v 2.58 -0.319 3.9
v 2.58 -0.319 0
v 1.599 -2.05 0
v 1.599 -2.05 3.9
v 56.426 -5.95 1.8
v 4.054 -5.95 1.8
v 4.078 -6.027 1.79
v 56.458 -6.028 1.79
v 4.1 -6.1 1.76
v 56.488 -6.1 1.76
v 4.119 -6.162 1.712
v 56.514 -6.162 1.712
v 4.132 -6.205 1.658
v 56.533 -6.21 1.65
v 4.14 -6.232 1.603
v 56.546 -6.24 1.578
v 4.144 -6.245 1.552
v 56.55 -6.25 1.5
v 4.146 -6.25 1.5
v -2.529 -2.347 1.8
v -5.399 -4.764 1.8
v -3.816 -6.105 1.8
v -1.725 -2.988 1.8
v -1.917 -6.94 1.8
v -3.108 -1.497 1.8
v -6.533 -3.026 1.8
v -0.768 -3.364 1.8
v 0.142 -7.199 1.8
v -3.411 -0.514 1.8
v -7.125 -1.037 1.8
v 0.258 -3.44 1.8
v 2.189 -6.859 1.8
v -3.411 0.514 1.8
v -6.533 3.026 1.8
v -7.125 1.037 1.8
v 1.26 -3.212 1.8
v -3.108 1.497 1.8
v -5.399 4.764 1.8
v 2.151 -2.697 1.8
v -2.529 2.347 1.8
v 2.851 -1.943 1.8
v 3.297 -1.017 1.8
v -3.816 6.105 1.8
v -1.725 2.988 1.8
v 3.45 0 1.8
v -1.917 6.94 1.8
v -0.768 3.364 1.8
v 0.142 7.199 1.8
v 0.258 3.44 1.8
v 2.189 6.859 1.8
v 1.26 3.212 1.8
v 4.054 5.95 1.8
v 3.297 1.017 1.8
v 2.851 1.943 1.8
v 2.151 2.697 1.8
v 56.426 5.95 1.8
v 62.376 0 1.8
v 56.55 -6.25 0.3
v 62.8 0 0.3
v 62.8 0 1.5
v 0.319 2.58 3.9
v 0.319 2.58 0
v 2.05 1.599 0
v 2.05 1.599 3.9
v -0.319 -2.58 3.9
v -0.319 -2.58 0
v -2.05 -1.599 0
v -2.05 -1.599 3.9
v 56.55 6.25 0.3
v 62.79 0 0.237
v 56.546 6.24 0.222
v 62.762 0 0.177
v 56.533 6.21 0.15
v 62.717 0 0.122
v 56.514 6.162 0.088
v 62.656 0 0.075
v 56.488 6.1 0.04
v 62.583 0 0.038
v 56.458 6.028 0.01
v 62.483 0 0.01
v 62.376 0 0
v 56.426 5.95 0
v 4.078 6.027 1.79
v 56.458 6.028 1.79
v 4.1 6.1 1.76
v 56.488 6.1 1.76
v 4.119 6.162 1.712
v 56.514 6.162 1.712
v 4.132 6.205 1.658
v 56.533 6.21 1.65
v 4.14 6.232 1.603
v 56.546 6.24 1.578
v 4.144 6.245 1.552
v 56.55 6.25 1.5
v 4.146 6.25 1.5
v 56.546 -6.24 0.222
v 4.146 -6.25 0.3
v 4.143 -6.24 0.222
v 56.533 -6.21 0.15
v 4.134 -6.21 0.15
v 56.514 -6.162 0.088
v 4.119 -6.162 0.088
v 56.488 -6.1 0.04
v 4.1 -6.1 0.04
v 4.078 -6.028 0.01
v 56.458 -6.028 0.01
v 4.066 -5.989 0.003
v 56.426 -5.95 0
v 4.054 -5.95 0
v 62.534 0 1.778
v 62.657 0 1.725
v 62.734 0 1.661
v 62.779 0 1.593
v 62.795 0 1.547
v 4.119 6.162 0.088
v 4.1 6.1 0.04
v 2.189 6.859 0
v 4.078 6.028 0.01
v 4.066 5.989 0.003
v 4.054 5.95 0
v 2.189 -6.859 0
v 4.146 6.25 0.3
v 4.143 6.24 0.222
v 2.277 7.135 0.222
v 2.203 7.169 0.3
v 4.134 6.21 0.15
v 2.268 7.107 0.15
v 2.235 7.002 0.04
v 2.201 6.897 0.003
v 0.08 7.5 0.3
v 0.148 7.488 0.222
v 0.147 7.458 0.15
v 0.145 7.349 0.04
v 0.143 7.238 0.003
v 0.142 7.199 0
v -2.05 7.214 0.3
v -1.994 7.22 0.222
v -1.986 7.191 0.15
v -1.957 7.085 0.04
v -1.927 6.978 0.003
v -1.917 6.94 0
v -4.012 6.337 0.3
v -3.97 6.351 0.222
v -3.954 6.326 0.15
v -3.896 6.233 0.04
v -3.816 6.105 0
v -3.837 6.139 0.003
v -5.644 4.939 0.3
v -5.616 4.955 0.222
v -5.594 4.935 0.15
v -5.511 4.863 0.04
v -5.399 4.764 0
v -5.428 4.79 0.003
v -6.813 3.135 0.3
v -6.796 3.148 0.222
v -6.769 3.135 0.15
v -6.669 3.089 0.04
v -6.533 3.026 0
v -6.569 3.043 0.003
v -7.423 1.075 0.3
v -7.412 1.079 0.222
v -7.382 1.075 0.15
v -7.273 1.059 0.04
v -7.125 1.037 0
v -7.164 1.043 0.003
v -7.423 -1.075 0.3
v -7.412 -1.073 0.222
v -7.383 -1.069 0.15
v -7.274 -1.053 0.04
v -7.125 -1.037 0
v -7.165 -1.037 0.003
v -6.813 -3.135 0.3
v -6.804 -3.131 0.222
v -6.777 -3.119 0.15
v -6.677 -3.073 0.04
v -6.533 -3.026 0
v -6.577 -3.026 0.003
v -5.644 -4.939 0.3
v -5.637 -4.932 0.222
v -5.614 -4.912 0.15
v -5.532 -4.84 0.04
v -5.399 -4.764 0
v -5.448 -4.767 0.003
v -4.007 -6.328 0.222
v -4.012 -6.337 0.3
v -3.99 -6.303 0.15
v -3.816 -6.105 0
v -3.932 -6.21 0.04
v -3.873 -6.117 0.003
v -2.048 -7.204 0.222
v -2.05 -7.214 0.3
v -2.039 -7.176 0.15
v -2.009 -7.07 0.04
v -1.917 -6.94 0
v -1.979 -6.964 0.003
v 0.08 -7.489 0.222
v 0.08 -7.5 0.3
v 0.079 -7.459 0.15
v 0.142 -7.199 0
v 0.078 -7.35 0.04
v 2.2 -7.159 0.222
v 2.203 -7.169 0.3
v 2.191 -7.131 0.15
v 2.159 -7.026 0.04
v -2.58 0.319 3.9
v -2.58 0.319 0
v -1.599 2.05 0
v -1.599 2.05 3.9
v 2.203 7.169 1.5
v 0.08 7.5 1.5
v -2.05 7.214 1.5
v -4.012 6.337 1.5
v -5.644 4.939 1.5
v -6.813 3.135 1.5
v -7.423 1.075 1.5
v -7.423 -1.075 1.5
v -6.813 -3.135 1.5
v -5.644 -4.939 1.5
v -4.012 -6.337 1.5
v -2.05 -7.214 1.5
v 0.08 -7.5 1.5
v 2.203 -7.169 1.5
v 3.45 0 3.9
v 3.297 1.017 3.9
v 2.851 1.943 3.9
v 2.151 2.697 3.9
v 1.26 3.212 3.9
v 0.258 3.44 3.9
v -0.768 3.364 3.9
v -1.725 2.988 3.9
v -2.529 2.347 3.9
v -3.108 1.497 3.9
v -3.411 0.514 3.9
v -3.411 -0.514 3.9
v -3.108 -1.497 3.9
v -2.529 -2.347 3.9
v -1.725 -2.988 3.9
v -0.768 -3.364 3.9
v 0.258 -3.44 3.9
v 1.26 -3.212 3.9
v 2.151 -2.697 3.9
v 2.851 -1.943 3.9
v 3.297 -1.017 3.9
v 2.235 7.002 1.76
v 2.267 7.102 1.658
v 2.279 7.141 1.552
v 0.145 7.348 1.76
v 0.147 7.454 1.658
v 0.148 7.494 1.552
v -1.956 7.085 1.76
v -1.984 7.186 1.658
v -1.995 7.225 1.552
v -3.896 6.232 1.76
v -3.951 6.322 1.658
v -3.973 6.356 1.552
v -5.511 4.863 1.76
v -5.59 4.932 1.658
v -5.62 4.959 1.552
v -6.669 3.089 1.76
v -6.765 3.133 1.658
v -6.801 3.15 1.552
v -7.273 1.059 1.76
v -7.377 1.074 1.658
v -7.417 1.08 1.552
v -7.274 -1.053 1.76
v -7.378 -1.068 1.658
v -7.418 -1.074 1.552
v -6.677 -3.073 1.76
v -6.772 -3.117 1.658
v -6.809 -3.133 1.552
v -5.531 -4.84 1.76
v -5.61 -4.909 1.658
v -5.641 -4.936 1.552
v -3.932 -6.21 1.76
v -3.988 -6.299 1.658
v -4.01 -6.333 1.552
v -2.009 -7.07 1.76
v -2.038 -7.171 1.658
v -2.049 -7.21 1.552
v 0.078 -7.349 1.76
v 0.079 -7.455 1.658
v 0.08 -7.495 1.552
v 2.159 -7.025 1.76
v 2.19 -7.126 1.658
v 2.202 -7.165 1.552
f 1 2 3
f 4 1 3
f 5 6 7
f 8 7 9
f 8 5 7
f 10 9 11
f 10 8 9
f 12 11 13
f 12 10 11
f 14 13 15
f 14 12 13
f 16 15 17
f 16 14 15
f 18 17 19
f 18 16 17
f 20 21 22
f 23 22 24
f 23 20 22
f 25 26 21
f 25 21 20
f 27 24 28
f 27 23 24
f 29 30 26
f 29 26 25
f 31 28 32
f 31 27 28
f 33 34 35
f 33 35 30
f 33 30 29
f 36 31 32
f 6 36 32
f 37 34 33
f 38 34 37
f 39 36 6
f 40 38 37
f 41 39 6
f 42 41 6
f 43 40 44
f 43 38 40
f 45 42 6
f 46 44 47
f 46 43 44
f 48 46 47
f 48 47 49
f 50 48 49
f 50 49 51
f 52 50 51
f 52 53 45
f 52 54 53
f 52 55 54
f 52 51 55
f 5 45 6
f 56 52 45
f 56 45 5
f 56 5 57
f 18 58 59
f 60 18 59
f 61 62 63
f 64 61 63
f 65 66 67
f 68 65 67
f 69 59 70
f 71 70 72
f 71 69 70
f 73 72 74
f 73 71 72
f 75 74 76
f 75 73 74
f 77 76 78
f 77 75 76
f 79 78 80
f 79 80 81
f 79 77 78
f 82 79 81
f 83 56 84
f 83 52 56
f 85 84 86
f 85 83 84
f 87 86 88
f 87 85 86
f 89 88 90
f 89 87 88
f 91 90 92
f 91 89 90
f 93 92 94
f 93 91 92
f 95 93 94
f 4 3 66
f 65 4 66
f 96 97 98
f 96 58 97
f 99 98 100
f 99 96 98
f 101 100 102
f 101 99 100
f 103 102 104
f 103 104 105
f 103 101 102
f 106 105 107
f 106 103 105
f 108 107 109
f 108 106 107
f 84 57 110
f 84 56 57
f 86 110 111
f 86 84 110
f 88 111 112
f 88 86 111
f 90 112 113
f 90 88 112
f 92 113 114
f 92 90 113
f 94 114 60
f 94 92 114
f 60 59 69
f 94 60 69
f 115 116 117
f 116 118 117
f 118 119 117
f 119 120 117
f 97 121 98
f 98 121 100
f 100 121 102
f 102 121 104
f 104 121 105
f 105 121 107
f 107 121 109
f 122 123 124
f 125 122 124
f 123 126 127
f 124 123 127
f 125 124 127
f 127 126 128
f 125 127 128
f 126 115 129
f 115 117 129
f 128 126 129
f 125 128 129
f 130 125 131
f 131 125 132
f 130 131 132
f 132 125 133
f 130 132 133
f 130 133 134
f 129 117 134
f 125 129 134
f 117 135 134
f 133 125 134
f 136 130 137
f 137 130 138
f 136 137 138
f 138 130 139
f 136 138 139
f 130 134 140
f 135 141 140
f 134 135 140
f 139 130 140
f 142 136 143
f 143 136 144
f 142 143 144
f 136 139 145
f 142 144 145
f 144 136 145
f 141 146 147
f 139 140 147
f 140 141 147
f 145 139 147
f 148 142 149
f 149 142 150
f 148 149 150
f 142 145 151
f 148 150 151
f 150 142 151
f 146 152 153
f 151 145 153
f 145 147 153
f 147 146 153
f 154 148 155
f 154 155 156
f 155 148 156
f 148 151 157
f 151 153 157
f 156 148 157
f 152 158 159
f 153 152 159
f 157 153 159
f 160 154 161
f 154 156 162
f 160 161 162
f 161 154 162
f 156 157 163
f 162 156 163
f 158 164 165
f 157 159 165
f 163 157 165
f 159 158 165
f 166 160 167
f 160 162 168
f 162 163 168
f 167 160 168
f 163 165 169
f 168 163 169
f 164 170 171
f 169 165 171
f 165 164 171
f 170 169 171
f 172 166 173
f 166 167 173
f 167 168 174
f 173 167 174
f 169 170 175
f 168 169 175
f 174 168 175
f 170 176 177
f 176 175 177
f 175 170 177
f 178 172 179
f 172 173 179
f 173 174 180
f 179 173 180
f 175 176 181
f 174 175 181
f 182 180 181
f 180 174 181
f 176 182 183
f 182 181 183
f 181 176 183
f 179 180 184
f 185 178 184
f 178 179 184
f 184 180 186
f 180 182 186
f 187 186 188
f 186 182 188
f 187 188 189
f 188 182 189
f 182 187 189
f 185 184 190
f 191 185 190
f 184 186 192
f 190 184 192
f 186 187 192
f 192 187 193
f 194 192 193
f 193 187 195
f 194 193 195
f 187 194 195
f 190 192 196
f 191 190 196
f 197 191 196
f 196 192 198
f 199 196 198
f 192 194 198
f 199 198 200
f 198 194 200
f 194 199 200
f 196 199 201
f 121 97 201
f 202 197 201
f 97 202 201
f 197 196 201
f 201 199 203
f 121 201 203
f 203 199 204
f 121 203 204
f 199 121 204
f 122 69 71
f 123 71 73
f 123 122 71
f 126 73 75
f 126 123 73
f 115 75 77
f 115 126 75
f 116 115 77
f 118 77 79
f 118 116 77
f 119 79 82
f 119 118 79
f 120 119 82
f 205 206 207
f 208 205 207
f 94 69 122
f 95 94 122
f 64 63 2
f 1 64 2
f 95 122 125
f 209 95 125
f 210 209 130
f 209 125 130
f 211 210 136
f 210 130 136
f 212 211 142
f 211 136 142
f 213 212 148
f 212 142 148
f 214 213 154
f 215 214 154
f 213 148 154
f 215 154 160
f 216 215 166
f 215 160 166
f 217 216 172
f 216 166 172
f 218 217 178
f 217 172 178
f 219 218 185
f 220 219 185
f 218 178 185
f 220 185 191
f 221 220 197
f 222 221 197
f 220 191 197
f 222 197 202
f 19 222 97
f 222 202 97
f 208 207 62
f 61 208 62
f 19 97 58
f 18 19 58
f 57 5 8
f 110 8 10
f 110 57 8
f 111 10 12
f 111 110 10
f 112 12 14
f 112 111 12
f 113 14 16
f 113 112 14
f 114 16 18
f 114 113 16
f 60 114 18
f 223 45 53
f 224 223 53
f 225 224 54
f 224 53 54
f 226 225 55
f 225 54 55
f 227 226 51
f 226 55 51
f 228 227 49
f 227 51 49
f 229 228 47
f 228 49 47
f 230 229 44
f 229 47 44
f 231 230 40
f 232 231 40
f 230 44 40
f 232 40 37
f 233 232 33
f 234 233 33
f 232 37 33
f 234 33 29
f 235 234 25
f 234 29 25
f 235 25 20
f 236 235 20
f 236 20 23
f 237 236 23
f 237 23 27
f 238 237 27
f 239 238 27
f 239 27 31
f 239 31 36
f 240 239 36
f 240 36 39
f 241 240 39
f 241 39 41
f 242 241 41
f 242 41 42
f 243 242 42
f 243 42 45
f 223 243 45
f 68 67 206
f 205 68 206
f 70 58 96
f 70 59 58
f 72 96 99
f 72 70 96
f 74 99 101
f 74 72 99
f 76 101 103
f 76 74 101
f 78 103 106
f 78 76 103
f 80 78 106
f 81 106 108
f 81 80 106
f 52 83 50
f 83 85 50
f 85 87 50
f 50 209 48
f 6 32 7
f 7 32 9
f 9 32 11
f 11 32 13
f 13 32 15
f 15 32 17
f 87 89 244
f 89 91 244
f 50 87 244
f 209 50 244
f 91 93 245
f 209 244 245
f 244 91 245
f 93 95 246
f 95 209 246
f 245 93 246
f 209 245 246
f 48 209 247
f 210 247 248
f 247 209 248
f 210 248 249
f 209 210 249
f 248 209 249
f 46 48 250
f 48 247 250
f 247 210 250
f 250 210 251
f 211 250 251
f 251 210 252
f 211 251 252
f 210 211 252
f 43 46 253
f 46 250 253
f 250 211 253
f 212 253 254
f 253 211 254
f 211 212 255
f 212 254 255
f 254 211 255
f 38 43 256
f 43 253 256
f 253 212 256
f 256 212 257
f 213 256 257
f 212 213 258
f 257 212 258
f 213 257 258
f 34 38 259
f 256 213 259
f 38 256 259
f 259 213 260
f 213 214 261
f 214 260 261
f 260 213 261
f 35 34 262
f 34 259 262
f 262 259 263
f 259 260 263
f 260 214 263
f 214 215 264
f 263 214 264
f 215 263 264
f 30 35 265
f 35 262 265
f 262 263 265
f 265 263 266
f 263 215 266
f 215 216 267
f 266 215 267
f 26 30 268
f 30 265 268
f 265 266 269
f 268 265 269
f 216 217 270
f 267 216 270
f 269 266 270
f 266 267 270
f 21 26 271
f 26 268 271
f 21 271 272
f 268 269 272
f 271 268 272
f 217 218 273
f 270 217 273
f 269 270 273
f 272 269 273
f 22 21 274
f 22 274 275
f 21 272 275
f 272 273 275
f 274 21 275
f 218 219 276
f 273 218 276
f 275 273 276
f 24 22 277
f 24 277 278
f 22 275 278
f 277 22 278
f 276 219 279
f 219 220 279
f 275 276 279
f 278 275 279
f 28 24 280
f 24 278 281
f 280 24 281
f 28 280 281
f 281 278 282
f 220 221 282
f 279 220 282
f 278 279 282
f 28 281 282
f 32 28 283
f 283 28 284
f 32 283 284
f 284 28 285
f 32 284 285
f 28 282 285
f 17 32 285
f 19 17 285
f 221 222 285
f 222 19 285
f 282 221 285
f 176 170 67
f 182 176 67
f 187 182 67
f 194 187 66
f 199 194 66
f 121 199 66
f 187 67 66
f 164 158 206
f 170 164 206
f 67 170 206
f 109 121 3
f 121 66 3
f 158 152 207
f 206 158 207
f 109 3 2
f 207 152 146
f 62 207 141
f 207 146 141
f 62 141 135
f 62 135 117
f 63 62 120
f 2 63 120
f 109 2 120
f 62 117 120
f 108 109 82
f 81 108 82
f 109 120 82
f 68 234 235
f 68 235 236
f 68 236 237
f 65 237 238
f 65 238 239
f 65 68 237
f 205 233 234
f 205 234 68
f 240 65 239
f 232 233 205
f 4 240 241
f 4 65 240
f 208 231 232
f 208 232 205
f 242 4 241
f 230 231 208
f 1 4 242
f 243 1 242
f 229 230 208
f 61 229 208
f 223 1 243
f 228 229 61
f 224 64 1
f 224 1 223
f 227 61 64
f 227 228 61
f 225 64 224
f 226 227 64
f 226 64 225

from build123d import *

# Parameters (mm, degrees)
F0_R     = 3.45
F1_DEPTH = 1.8
F2_DEPTH = 3.9
F3_R     = 0.3


with BuildPart() as f1:
    # F0 (on Top) → F1 (new body)
    with BuildSketch(Plane.XY):
        with BuildLine():
            Line((56.55, 6.25), (4.145781, 6.25))
            ThreePointArc((4.145781, 6.25), (-7.5, 0), (4.145781, -6.25))
            Line((4.145781, -6.25), (56.55, -6.25))
            Line((56.55, -6.25), (62.8, 0))
            Line((62.8, 0), (56.55, 6.25))
        make_face()
        Circle(F0_R, mode=Mode.SUBTRACT)
    extrude(amount=F1_DEPTH)

    # F0 (on Top) → F2 (join)
    with BuildSketch(Plane.XY):
        Circle(F0_R)
        Polygon((2.580316, -0.319324), (1.598763, -2.050355), (-0.319324, -2.580316), (-2.050355, -1.598763), (-2.580316, 0.319324), (-1.598763, 2.050355), (0.319324, 2.580316), (2.050355, 1.598763), align=None, mode=Mode.SUBTRACT)
    extrude(amount=F2_DEPTH)

    # F3
    f3_edges = [f1.edges().sort_by_distance(p)[0] for p in [
        (-7.5, 0, 1.8),
        (30.34789, 6.25, 1.8),
        (30.34789, -6.25, 1.8),
        (59.675, -3.125, 1.8),
        (59.675, 3.125, 1.8),
        (-7.5, 0, 0),
        (30.34789, -6.25, 0),
        (59.675, 3.125, 0),
        (59.675, -3.125, 0),
        (30.34789, 6.25, 0),
    ]]
    fillet(f3_edges, radius=F3_R)


solid = f1.part
